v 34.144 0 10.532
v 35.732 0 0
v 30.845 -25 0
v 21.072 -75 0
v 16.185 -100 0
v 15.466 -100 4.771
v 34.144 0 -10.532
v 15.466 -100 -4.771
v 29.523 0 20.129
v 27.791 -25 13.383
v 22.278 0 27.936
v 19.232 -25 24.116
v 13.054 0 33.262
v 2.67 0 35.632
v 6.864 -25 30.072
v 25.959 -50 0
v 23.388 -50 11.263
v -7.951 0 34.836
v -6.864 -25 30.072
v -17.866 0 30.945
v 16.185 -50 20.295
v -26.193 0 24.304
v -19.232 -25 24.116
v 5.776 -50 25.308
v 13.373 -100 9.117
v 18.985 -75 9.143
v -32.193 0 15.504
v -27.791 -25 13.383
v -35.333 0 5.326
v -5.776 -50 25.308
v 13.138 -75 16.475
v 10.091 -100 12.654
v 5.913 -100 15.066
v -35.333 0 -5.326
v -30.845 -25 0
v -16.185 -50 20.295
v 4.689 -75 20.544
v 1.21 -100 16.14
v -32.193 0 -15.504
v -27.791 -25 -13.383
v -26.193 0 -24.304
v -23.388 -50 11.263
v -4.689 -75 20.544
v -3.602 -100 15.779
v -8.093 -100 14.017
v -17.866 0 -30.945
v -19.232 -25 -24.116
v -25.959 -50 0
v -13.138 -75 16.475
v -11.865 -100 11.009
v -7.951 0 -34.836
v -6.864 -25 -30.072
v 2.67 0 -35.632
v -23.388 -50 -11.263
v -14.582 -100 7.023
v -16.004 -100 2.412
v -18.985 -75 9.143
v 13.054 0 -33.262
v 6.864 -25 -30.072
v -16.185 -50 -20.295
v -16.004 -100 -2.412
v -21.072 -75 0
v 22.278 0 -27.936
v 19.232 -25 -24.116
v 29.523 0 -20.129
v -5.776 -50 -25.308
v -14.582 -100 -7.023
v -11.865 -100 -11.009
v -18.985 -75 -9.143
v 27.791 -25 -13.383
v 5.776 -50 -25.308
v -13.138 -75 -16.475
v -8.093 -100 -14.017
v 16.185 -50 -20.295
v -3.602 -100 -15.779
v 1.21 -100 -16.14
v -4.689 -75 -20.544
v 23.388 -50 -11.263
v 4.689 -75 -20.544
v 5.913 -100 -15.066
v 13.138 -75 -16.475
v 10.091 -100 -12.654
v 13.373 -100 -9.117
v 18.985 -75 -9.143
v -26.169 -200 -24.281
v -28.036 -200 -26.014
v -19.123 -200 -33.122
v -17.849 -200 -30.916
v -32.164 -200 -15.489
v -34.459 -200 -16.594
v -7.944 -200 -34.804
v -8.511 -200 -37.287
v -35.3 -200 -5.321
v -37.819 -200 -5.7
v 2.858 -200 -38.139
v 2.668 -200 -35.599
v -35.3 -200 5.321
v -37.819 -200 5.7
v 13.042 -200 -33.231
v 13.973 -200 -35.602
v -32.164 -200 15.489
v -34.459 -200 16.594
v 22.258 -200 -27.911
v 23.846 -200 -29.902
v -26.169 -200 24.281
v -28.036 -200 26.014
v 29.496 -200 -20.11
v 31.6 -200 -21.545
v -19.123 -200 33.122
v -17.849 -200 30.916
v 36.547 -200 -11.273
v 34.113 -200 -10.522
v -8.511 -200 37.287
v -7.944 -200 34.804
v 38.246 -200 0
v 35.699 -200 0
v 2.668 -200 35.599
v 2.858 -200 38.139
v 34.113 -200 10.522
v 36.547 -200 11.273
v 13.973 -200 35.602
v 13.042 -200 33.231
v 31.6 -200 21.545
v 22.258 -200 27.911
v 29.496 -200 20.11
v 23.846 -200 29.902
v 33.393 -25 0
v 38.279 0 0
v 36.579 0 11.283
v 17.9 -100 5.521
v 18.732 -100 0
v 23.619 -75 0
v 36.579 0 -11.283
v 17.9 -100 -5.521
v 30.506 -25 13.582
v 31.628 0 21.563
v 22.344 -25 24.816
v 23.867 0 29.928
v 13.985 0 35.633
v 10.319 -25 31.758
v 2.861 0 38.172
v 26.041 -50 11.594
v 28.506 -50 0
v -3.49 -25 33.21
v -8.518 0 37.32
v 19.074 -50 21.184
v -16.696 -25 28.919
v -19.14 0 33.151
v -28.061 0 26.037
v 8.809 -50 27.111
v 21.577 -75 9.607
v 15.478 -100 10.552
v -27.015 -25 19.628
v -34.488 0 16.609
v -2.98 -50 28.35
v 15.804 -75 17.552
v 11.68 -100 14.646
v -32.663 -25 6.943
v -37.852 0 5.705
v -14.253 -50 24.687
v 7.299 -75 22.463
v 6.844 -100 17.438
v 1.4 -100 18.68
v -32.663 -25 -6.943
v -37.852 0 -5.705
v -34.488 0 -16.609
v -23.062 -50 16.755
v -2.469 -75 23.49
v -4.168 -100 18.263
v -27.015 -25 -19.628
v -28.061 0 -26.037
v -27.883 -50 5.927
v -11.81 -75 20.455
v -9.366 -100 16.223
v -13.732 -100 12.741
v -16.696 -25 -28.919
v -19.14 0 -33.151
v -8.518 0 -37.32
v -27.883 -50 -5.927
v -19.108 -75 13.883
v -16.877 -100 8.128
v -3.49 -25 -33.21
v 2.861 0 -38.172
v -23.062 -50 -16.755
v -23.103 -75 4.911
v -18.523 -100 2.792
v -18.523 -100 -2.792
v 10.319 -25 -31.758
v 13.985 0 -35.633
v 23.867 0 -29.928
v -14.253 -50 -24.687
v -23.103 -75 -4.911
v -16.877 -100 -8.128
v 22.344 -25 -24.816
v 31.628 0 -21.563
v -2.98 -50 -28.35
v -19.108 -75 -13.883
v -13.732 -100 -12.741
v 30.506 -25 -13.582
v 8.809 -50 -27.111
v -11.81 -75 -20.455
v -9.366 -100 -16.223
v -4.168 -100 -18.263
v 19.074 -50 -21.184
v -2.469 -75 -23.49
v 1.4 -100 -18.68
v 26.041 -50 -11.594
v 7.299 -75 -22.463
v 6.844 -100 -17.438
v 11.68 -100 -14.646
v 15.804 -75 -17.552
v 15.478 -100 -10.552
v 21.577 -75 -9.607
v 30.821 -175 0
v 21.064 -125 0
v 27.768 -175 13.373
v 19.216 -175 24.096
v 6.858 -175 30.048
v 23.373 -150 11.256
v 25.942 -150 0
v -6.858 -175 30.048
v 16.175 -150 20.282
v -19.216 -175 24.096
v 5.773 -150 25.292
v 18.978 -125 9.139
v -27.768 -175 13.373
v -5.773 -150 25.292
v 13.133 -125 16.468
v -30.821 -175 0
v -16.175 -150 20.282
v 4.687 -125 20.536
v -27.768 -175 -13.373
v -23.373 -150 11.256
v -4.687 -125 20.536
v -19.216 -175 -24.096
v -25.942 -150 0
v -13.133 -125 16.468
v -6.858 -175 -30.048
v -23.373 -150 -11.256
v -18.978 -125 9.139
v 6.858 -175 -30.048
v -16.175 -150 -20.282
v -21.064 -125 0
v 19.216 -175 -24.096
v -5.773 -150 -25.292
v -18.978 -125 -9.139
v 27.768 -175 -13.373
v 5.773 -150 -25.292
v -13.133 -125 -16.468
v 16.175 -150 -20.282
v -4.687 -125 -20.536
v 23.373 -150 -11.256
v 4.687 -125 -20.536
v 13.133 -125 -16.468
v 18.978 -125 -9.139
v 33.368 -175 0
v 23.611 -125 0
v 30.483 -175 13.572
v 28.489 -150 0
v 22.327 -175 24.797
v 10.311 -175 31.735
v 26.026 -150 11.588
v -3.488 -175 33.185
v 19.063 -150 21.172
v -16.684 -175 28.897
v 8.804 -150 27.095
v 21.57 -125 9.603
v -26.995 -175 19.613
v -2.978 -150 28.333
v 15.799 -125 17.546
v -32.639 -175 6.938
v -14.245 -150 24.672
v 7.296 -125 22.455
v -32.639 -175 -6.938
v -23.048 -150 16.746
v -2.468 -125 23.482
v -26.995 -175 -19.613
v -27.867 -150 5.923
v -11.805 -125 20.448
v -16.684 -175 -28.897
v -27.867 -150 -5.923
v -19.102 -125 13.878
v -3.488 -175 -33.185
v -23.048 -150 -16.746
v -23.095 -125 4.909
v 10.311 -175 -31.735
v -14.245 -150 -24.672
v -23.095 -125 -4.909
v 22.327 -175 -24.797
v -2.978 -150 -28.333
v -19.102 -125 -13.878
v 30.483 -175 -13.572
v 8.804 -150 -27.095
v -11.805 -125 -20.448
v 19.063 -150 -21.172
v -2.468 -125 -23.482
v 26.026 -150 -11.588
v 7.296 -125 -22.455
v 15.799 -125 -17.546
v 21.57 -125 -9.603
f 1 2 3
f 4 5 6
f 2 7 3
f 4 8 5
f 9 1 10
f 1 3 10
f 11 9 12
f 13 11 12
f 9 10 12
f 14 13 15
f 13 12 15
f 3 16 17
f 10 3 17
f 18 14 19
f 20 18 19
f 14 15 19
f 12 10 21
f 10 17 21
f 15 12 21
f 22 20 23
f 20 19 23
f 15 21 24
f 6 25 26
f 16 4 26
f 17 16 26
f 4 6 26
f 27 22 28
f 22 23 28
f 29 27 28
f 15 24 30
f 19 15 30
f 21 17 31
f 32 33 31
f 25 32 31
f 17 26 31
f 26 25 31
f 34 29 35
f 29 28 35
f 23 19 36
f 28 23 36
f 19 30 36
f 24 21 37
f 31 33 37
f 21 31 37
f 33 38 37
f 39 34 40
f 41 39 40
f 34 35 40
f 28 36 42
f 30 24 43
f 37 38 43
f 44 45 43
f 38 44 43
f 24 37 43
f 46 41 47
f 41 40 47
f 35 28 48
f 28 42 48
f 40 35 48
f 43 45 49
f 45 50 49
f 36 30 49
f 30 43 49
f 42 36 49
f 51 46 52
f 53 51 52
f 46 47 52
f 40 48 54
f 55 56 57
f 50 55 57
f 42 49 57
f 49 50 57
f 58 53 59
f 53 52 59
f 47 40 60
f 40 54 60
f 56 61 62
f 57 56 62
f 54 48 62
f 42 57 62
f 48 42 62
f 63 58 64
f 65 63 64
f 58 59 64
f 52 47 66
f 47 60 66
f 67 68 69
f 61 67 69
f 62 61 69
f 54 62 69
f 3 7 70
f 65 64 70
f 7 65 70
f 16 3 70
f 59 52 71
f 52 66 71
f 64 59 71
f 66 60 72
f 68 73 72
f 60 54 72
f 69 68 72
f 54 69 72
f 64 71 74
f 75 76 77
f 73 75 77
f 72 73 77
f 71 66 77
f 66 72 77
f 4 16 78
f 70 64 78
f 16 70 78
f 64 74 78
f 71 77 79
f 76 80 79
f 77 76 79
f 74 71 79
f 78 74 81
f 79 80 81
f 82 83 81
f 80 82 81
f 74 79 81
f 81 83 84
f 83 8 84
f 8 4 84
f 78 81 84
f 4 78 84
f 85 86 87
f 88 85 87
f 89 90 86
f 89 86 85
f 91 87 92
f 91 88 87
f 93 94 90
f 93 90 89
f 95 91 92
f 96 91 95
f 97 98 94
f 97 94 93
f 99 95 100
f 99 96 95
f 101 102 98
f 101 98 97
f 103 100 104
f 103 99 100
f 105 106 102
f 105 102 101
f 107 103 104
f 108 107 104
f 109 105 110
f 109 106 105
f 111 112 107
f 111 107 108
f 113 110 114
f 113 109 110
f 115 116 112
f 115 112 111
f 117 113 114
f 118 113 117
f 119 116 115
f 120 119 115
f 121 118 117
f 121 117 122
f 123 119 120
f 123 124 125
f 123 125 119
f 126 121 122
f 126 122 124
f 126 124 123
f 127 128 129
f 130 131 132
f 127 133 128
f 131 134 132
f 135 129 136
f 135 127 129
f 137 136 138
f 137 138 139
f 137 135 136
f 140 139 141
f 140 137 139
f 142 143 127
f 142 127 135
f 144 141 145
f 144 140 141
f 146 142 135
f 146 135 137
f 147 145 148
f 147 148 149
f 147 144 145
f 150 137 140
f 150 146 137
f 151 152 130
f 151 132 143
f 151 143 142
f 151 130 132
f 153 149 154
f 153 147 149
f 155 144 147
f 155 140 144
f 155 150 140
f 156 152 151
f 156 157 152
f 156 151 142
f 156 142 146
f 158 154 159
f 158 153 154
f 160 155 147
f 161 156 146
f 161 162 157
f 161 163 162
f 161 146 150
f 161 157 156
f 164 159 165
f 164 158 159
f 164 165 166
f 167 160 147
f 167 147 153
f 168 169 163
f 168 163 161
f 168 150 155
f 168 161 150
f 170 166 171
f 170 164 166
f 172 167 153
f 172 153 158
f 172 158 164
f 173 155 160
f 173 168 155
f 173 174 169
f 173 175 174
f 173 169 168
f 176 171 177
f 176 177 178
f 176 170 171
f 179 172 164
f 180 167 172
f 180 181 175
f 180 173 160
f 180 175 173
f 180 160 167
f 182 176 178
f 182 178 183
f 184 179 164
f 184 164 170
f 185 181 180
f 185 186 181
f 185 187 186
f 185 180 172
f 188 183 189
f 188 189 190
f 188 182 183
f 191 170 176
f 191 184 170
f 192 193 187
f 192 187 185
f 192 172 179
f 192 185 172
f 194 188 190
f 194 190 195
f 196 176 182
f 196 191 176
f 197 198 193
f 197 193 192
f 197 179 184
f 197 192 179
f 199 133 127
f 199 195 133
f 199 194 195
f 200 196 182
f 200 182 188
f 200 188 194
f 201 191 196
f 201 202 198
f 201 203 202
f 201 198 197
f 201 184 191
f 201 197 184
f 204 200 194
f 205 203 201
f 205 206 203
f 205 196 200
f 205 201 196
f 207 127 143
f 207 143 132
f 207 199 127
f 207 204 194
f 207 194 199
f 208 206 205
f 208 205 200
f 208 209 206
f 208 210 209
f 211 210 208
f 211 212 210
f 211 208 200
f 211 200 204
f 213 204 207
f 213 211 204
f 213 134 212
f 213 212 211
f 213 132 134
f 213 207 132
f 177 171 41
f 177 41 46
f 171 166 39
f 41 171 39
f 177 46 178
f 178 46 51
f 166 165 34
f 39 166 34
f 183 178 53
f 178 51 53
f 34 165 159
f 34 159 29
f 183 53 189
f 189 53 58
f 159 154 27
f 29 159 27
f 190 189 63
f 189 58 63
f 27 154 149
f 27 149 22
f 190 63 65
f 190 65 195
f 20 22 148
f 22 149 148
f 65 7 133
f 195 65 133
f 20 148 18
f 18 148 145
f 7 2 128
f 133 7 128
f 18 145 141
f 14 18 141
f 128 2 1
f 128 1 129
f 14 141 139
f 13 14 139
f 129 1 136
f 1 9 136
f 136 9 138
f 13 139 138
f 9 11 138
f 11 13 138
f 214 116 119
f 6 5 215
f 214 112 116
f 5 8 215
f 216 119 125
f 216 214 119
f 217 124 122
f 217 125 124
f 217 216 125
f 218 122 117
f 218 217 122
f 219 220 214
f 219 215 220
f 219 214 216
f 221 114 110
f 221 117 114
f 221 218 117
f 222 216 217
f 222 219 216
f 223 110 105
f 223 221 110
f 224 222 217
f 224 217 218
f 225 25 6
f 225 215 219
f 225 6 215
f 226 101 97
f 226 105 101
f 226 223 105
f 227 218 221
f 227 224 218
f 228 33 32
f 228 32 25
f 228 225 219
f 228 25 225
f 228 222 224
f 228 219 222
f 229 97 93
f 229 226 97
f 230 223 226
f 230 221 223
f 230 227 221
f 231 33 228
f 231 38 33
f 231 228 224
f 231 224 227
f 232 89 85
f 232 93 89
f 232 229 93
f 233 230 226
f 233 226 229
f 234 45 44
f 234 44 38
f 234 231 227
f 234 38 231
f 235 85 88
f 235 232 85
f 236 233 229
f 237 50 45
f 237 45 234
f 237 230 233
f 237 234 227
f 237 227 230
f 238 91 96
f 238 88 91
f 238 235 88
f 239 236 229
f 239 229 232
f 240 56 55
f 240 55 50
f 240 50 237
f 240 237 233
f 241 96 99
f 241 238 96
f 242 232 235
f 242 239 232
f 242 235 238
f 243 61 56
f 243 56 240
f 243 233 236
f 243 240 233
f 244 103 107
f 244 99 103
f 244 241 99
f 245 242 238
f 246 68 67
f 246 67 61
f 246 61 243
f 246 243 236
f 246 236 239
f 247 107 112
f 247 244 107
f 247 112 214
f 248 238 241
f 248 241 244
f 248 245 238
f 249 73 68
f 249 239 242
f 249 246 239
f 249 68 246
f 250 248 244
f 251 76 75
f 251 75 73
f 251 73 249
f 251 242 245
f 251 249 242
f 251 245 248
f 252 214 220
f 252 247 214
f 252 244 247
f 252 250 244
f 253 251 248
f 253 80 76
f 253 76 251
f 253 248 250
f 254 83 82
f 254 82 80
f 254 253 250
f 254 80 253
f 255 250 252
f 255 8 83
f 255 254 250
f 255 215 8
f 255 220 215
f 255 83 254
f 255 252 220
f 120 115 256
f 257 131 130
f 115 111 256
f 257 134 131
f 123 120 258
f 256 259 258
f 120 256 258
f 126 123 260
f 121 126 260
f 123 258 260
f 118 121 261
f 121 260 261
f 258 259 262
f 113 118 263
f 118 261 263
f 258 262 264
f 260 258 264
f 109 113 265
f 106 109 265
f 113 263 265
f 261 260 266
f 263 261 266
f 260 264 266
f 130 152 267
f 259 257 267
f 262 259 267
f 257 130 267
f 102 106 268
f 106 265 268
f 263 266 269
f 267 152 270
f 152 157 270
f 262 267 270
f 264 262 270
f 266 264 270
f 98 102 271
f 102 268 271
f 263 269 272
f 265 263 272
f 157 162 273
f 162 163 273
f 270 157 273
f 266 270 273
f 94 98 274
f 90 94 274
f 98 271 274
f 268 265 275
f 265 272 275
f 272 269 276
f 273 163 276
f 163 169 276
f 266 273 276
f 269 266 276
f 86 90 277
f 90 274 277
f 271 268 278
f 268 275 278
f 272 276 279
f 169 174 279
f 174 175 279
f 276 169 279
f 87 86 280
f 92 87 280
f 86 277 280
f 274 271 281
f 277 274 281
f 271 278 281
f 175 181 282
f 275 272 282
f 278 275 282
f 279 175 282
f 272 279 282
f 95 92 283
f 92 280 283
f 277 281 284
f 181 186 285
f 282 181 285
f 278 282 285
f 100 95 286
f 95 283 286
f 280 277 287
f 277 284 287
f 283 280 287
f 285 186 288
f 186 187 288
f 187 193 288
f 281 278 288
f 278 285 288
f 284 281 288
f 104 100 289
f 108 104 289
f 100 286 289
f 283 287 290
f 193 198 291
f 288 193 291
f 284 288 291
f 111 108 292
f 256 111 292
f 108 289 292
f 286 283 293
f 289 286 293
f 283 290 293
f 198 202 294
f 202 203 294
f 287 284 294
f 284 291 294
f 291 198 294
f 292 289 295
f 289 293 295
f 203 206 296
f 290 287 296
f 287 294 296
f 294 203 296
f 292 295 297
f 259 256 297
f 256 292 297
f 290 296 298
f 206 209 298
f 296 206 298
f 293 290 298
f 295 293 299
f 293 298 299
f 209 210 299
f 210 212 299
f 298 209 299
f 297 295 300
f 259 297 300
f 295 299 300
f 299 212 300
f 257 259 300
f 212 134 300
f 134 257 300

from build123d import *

# Parameters (mm, degrees)
F0_R      = 38.279248166
F2_R      = 18.7324901921
F5_R      = 38.2461043671
F3_FACE_R = 18.7324901921
F7_T      = -2.5


with BuildPart() as f3:
    # F0 (on Front) → F3 section 0
    with BuildSketch(Plane.XZ):
        Circle(F0_R)
    # F2 (on offset) → F3 section 1
    with BuildSketch(Plane.XZ.offset(100)):
        Circle(F2_R)
    loft()

    # F5 (on offset) → F6 section 0
    with BuildSketch(Plane.XZ.offset(200)):
        Circle(F5_R)
    # F3_face (on face) → F6 section 1
    with BuildSketch(Plane.XZ.offset(100)):
        Circle(F3_FACE_R)
    loft()

    # F7
    f7_openings = [f3.faces().sort_by_distance(p)[0] for p in [
        (0, -200, 0),
        (0, 0, 0),
    ]]
    offset(amount=F7_T, openings=f7_openings, kind=Kind.INTERSECTION)


solid = f3.part
